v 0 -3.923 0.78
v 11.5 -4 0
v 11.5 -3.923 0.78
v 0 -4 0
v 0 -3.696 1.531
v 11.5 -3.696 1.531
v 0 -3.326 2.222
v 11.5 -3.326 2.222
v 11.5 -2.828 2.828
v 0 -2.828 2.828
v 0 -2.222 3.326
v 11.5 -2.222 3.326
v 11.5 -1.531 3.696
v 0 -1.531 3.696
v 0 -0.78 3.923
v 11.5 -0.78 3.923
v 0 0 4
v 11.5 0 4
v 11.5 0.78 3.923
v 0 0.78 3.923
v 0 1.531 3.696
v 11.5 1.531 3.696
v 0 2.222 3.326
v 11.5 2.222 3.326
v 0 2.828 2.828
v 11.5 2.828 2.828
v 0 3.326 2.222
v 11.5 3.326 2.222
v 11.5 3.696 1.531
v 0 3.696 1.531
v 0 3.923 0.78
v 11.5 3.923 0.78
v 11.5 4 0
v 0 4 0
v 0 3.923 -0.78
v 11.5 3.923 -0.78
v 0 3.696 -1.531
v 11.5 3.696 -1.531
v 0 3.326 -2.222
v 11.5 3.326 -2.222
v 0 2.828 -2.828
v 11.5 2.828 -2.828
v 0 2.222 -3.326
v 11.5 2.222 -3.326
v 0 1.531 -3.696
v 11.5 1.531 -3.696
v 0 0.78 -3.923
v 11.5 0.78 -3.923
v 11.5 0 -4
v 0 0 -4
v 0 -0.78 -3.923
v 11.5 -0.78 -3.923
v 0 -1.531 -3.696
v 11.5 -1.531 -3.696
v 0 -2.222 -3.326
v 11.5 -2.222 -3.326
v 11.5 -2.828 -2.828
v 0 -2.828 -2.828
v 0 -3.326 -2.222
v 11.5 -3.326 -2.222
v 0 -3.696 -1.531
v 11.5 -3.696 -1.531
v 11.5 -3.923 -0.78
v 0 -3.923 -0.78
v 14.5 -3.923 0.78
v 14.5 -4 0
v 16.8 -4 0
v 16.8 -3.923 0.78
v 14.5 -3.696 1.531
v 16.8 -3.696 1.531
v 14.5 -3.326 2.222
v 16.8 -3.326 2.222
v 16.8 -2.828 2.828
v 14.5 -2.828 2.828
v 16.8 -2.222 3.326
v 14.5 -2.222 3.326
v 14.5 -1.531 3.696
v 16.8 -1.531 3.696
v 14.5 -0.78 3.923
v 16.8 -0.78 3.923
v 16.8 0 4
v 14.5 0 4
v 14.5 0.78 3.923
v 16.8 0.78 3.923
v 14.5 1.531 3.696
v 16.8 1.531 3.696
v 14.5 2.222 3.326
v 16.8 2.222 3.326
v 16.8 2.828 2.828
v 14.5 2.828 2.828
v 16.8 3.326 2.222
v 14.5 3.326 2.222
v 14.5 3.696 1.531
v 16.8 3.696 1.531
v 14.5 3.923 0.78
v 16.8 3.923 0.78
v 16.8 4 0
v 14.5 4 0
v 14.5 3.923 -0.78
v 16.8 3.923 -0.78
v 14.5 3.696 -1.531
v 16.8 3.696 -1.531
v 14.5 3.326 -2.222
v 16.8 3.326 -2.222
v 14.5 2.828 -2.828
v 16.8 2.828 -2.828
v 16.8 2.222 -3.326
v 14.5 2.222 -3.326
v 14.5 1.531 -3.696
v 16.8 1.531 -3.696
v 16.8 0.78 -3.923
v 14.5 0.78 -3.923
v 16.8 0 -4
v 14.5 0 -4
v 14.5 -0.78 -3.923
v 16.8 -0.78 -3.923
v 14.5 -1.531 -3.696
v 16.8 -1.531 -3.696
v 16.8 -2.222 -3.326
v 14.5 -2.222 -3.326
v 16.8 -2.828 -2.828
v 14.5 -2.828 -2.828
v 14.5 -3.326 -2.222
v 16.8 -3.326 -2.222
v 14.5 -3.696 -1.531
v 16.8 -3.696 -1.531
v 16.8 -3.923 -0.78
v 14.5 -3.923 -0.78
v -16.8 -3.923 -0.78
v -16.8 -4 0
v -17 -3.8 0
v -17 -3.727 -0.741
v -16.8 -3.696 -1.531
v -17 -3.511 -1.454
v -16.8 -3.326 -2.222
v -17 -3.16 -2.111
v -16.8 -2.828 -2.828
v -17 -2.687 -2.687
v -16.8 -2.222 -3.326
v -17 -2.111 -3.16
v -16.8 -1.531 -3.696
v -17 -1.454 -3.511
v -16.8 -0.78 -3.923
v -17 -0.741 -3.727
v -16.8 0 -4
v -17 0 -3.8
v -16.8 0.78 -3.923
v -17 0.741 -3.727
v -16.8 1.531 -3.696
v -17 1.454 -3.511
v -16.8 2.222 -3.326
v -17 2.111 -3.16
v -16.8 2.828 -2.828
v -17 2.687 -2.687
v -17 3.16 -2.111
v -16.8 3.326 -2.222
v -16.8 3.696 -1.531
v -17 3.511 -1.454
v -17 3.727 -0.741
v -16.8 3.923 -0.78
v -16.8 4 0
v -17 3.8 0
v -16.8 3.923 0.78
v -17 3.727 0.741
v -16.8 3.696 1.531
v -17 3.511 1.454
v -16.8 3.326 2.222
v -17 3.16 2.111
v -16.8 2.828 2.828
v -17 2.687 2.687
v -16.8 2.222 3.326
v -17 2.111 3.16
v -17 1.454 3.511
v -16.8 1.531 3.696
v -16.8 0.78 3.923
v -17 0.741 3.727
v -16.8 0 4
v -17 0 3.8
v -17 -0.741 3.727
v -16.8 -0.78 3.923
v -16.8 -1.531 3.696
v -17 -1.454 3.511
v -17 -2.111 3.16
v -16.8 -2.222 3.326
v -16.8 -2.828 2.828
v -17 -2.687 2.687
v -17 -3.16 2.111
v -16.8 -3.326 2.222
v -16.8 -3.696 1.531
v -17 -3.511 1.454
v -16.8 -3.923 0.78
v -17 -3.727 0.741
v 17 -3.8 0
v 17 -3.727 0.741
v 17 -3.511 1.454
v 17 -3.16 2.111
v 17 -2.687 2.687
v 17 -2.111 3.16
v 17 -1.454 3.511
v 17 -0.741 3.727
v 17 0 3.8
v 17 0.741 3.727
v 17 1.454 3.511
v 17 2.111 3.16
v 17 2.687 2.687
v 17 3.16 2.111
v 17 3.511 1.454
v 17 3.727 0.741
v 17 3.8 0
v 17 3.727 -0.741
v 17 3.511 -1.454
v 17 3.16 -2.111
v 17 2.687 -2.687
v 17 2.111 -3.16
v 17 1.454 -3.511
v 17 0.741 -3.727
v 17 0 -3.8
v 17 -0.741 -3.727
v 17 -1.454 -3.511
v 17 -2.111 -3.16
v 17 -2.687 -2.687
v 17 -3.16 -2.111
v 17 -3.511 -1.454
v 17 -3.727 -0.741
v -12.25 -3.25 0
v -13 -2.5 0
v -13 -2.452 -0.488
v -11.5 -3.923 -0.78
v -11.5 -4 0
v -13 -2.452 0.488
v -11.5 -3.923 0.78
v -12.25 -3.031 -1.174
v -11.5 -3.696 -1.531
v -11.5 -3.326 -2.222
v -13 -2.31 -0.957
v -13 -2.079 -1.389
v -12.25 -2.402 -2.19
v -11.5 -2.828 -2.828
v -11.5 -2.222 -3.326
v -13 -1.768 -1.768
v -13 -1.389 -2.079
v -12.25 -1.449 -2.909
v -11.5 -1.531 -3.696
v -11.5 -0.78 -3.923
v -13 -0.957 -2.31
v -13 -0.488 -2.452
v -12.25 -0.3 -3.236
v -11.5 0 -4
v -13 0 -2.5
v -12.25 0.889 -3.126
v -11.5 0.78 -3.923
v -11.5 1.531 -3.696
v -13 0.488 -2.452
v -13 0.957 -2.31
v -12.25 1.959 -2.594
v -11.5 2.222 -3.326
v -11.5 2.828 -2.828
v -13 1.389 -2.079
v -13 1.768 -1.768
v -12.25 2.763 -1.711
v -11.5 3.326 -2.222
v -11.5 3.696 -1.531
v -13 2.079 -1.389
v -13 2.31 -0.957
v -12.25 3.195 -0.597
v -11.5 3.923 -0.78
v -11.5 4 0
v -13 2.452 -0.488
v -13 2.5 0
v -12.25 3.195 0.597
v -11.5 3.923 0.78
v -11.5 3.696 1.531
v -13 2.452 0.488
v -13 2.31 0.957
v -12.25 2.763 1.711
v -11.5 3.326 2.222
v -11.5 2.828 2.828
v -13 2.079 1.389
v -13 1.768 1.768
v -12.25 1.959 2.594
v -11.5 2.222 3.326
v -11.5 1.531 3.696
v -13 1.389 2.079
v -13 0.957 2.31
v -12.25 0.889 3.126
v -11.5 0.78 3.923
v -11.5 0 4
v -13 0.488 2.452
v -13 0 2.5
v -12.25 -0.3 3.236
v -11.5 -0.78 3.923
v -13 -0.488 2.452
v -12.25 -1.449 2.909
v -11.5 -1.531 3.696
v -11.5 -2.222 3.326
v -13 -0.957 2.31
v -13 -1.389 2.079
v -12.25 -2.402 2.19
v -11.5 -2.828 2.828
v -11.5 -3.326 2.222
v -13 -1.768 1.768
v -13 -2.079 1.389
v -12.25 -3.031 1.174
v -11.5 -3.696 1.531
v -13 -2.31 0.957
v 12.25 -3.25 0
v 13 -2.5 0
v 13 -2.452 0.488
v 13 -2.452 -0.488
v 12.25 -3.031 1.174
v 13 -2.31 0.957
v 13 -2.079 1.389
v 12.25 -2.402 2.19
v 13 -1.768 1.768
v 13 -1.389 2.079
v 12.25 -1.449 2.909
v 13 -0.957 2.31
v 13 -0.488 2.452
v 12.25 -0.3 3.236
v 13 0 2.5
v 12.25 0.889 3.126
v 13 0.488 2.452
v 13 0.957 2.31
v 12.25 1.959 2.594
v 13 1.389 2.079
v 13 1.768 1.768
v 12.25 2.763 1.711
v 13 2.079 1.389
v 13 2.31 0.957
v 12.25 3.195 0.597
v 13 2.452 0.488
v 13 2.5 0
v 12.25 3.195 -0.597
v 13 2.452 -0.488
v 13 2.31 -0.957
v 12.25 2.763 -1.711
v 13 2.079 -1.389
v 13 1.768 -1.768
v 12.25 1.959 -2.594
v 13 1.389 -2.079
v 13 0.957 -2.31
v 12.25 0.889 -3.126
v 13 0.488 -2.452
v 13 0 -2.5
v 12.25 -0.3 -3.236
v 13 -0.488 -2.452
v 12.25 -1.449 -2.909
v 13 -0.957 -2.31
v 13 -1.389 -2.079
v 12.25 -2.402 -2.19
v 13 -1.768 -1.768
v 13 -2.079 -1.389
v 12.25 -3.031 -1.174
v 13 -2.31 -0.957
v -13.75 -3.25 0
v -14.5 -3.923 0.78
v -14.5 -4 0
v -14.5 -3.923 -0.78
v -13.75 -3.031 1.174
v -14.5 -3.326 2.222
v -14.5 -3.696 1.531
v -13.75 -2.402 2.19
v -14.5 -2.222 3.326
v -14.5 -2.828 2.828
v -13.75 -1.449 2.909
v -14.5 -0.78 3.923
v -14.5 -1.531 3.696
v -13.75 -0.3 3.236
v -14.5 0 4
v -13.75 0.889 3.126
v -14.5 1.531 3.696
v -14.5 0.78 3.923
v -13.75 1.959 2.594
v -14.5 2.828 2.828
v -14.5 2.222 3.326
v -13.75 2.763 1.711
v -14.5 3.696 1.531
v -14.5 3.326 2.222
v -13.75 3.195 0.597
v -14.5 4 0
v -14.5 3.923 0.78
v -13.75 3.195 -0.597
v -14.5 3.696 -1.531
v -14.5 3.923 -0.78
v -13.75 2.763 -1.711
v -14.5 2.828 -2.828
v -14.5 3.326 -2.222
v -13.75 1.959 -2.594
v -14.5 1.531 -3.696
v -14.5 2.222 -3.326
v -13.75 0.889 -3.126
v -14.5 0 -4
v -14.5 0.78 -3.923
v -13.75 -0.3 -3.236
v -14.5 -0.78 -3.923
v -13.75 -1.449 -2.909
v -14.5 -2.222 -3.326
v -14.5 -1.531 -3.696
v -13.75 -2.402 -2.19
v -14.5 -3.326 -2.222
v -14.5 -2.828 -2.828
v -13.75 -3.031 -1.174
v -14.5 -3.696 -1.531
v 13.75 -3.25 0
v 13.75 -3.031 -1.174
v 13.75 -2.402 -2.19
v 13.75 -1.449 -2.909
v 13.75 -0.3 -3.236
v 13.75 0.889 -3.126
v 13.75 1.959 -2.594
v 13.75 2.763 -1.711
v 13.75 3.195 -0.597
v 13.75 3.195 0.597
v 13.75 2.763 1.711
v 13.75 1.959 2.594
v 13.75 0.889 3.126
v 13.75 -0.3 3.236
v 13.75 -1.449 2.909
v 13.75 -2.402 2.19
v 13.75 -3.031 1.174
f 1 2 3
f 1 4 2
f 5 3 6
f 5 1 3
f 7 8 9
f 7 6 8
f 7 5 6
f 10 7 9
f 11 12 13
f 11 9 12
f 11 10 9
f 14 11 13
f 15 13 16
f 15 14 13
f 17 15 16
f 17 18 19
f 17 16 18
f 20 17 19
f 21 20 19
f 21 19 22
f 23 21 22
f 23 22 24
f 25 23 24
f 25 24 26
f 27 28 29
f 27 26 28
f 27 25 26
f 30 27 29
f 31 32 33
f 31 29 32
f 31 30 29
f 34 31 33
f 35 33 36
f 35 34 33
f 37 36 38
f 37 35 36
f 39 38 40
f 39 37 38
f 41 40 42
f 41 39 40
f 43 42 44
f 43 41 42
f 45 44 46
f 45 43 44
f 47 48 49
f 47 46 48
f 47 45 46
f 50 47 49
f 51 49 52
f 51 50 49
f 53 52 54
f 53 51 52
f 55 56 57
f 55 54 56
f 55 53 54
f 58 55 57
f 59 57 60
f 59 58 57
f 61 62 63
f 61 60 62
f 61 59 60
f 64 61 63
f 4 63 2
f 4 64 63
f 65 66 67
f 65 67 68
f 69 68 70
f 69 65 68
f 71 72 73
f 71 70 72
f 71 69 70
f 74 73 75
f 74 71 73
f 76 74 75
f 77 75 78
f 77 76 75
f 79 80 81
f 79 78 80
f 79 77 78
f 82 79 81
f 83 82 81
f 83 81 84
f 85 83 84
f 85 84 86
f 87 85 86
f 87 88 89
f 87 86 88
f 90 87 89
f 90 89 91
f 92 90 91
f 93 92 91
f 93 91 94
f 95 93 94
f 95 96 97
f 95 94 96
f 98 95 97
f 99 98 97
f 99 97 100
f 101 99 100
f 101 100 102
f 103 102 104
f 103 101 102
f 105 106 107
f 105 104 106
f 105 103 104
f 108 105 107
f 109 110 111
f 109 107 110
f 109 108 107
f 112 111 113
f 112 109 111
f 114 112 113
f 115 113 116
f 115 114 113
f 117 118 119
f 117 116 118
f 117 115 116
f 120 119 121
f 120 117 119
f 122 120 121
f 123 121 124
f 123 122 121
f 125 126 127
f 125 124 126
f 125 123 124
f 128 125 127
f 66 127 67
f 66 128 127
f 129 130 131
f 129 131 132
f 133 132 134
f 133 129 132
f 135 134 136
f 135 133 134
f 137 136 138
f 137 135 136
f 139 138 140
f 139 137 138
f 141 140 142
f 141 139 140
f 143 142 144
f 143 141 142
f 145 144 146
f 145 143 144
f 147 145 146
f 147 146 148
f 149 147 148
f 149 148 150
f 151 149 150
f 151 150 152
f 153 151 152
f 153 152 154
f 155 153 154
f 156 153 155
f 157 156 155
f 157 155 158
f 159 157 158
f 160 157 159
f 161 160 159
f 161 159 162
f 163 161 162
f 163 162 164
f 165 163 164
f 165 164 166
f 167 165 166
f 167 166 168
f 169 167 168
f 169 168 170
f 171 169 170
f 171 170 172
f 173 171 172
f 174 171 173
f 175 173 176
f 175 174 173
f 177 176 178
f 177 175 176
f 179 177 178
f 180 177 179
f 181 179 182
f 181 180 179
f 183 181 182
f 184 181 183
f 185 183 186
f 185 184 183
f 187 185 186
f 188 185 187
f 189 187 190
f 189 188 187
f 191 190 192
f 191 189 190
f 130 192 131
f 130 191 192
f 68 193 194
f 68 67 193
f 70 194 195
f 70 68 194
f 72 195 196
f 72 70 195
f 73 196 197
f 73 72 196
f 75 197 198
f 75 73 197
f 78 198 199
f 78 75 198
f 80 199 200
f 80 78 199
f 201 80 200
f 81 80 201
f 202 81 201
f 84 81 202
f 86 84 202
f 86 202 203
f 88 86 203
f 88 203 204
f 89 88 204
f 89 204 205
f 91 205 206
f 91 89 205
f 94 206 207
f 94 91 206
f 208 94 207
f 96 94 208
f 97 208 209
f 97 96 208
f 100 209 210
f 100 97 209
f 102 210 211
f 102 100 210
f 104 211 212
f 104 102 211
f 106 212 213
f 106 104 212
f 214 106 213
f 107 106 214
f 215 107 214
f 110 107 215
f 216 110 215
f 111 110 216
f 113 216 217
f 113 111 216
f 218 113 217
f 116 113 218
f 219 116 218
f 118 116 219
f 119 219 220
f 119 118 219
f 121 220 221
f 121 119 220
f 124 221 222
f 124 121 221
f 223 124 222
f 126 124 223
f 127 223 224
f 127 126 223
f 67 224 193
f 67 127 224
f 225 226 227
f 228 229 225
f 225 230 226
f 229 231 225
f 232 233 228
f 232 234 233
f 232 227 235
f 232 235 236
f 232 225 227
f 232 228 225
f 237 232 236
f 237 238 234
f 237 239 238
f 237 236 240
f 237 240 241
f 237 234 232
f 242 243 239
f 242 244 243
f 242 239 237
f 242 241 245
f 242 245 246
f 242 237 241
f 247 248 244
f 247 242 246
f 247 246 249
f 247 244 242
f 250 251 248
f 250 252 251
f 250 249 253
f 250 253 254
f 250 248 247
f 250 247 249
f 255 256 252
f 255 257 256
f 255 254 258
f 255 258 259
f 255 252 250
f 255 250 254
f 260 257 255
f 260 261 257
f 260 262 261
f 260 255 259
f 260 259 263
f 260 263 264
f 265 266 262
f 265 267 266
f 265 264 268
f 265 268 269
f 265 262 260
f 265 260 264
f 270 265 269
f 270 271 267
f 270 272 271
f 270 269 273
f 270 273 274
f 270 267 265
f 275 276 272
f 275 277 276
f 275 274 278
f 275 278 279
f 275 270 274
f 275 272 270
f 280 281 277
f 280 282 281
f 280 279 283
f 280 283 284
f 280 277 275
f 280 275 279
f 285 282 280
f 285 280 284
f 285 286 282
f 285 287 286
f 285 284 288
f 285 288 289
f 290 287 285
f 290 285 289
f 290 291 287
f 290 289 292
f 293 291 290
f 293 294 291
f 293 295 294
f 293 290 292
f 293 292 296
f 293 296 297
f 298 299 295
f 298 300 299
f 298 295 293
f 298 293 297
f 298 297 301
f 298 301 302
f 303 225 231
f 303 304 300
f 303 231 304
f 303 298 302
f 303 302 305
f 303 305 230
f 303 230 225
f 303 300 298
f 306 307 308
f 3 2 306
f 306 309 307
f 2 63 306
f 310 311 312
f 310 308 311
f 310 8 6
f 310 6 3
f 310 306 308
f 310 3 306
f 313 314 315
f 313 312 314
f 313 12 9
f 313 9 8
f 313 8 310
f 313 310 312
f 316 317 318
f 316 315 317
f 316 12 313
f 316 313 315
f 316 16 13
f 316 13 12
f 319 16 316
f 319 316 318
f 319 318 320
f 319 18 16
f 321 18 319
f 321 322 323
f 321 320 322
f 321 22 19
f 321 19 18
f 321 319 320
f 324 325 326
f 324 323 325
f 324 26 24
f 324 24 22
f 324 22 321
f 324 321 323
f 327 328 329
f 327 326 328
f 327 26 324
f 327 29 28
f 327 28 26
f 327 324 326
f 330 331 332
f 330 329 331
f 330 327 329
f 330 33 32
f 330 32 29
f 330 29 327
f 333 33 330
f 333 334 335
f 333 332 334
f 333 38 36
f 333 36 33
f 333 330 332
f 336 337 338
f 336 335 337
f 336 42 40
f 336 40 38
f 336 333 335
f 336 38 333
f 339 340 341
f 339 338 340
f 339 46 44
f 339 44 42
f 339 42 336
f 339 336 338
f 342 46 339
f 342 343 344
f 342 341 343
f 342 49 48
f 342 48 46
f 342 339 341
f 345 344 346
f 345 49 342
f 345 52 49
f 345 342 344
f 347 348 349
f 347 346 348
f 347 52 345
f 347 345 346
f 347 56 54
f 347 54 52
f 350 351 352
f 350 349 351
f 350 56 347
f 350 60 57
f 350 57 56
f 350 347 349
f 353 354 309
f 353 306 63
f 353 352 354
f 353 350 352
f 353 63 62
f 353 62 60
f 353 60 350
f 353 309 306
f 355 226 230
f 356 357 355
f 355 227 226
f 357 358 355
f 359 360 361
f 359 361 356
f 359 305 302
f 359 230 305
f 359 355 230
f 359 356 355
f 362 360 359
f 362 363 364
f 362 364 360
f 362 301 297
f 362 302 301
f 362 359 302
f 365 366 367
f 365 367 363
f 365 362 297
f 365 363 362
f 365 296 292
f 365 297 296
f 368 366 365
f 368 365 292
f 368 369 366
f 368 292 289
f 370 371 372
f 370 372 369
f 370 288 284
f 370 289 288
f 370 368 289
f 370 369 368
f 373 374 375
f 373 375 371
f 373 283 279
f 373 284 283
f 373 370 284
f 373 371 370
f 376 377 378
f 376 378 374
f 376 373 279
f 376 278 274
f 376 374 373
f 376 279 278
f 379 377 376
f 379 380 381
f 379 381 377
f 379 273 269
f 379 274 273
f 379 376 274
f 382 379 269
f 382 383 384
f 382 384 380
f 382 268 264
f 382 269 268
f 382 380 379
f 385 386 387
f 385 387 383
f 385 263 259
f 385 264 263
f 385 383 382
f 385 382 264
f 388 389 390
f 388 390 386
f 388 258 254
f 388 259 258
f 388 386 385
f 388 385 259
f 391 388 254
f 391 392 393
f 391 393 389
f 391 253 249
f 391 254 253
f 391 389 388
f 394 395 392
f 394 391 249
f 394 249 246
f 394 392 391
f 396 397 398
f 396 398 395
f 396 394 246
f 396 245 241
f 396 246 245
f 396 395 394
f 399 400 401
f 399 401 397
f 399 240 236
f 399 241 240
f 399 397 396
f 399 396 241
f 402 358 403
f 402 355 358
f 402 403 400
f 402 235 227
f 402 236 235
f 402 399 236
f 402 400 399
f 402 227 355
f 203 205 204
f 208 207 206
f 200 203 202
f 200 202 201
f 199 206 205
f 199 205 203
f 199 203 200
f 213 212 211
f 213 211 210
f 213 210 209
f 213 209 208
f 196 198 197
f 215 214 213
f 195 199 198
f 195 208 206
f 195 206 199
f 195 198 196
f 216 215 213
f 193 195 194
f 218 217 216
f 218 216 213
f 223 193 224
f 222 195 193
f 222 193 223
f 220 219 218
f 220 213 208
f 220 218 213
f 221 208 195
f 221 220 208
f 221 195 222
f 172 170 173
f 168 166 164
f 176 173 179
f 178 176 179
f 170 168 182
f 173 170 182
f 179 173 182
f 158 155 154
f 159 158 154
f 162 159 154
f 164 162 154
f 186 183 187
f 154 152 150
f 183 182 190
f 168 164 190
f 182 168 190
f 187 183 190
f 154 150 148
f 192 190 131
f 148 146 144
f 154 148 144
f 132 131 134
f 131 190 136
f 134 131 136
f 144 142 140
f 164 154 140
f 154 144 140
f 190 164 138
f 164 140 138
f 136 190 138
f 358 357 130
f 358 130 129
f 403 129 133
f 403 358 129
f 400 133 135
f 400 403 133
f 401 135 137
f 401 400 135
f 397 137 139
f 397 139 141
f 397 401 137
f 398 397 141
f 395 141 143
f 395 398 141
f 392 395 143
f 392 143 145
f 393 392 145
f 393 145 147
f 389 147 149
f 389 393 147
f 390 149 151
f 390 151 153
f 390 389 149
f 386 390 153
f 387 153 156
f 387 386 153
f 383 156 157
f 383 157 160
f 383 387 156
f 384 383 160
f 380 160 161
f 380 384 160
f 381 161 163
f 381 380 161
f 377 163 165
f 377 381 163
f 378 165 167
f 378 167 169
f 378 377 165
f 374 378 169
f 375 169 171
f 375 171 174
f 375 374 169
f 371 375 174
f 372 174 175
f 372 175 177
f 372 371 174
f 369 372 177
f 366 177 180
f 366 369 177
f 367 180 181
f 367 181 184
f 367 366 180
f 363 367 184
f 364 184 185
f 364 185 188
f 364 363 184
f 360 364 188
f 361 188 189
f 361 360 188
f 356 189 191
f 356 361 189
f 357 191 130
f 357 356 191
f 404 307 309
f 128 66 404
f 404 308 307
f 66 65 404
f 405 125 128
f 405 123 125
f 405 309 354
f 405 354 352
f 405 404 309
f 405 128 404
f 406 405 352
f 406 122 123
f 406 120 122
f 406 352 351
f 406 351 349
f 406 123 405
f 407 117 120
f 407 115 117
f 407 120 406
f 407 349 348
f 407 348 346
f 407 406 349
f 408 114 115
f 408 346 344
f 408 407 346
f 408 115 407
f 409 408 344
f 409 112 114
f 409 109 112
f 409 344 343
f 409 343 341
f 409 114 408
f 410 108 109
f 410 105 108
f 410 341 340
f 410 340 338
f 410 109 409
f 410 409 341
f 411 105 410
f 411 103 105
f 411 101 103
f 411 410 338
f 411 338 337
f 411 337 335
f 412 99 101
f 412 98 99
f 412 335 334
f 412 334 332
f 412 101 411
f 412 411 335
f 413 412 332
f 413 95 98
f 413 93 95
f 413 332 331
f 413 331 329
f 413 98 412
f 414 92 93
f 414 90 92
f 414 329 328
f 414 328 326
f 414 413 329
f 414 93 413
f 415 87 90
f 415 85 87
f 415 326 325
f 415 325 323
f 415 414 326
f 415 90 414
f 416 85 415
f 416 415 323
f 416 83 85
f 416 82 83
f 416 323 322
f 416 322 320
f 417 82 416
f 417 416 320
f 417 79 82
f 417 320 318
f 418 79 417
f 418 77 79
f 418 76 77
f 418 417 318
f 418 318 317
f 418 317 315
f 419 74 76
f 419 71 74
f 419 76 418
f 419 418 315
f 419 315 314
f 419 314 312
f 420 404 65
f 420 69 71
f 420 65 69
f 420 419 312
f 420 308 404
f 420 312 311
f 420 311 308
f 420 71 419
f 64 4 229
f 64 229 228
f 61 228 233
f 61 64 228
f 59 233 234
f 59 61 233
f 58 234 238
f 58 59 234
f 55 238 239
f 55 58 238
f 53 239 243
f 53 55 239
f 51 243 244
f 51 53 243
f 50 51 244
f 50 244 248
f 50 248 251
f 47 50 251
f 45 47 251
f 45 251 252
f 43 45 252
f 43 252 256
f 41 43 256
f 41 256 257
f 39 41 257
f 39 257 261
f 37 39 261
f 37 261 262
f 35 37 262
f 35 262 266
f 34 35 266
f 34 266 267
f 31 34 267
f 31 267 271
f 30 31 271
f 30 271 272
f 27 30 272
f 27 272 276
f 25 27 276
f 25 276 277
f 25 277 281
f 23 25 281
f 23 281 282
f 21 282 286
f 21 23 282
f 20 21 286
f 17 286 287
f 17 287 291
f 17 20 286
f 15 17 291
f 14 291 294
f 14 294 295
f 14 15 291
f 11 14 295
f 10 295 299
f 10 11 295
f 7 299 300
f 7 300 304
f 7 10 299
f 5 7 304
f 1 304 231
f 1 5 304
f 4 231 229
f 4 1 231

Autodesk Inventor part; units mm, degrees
ref_plane "YZ Plane" through (0, 0, 0) normal (1, 0, 0) x (0, 1, 0)
ref_plane "XZ Plane" through (0, 0, 0) normal (0, 1, 0) x (-1, 0, 0)
ref_plane "XY Plane" through (0, 0, 0) normal (0, 0, 1) x (1, 0, 0)
sketch "Sketch2" plane through (0, 0, 0) normal (0, 0, 1) x (1, 0, 0)
  line L0 (-17, 0) -> (17, 0)
  line L1 (-17, 0) -> (-17, -4)
  line L2 (-17, -4) -> (-14.5, -4)
  line L3 (-14.5, -4) -> (-13, -2.5)
  line L4 (-13, -2.5) -> (-11.5, -4)
  line L5 (-11.5, -4) -> (0, -4)
  line L6 (0, 0) -> (0, -4) construction
  line L7 (-13, -2.5) -> (-13, 0) construction
  line L8 (17, 0) -> (17, -4)
  line L9 (17, -4) -> (14.5, -4)
  line L10 (14.5, -4) -> (13, -2.5)
  line L11 (13, -2.5) -> (11.5, -4)
  line L12 (11.5, -4) -> (0, -4)
  dimension "d1" = 34
  dimension "d2" = 135
  dimension "d3" = 4
  dimension "d4" = 8
  dimension "d5" = 3
revolve "Revolution1" add sketch "Sketch2" angle 360 about axis through (-17, 0, 0) along (1, 0, 0)
chamfer "Chamfer1" distance 0.2 angle 45 2 edges at (-17, 4, 0) (17, 4, 0)
properties part number "TL20240701-10100AT-002" material "S45C"
